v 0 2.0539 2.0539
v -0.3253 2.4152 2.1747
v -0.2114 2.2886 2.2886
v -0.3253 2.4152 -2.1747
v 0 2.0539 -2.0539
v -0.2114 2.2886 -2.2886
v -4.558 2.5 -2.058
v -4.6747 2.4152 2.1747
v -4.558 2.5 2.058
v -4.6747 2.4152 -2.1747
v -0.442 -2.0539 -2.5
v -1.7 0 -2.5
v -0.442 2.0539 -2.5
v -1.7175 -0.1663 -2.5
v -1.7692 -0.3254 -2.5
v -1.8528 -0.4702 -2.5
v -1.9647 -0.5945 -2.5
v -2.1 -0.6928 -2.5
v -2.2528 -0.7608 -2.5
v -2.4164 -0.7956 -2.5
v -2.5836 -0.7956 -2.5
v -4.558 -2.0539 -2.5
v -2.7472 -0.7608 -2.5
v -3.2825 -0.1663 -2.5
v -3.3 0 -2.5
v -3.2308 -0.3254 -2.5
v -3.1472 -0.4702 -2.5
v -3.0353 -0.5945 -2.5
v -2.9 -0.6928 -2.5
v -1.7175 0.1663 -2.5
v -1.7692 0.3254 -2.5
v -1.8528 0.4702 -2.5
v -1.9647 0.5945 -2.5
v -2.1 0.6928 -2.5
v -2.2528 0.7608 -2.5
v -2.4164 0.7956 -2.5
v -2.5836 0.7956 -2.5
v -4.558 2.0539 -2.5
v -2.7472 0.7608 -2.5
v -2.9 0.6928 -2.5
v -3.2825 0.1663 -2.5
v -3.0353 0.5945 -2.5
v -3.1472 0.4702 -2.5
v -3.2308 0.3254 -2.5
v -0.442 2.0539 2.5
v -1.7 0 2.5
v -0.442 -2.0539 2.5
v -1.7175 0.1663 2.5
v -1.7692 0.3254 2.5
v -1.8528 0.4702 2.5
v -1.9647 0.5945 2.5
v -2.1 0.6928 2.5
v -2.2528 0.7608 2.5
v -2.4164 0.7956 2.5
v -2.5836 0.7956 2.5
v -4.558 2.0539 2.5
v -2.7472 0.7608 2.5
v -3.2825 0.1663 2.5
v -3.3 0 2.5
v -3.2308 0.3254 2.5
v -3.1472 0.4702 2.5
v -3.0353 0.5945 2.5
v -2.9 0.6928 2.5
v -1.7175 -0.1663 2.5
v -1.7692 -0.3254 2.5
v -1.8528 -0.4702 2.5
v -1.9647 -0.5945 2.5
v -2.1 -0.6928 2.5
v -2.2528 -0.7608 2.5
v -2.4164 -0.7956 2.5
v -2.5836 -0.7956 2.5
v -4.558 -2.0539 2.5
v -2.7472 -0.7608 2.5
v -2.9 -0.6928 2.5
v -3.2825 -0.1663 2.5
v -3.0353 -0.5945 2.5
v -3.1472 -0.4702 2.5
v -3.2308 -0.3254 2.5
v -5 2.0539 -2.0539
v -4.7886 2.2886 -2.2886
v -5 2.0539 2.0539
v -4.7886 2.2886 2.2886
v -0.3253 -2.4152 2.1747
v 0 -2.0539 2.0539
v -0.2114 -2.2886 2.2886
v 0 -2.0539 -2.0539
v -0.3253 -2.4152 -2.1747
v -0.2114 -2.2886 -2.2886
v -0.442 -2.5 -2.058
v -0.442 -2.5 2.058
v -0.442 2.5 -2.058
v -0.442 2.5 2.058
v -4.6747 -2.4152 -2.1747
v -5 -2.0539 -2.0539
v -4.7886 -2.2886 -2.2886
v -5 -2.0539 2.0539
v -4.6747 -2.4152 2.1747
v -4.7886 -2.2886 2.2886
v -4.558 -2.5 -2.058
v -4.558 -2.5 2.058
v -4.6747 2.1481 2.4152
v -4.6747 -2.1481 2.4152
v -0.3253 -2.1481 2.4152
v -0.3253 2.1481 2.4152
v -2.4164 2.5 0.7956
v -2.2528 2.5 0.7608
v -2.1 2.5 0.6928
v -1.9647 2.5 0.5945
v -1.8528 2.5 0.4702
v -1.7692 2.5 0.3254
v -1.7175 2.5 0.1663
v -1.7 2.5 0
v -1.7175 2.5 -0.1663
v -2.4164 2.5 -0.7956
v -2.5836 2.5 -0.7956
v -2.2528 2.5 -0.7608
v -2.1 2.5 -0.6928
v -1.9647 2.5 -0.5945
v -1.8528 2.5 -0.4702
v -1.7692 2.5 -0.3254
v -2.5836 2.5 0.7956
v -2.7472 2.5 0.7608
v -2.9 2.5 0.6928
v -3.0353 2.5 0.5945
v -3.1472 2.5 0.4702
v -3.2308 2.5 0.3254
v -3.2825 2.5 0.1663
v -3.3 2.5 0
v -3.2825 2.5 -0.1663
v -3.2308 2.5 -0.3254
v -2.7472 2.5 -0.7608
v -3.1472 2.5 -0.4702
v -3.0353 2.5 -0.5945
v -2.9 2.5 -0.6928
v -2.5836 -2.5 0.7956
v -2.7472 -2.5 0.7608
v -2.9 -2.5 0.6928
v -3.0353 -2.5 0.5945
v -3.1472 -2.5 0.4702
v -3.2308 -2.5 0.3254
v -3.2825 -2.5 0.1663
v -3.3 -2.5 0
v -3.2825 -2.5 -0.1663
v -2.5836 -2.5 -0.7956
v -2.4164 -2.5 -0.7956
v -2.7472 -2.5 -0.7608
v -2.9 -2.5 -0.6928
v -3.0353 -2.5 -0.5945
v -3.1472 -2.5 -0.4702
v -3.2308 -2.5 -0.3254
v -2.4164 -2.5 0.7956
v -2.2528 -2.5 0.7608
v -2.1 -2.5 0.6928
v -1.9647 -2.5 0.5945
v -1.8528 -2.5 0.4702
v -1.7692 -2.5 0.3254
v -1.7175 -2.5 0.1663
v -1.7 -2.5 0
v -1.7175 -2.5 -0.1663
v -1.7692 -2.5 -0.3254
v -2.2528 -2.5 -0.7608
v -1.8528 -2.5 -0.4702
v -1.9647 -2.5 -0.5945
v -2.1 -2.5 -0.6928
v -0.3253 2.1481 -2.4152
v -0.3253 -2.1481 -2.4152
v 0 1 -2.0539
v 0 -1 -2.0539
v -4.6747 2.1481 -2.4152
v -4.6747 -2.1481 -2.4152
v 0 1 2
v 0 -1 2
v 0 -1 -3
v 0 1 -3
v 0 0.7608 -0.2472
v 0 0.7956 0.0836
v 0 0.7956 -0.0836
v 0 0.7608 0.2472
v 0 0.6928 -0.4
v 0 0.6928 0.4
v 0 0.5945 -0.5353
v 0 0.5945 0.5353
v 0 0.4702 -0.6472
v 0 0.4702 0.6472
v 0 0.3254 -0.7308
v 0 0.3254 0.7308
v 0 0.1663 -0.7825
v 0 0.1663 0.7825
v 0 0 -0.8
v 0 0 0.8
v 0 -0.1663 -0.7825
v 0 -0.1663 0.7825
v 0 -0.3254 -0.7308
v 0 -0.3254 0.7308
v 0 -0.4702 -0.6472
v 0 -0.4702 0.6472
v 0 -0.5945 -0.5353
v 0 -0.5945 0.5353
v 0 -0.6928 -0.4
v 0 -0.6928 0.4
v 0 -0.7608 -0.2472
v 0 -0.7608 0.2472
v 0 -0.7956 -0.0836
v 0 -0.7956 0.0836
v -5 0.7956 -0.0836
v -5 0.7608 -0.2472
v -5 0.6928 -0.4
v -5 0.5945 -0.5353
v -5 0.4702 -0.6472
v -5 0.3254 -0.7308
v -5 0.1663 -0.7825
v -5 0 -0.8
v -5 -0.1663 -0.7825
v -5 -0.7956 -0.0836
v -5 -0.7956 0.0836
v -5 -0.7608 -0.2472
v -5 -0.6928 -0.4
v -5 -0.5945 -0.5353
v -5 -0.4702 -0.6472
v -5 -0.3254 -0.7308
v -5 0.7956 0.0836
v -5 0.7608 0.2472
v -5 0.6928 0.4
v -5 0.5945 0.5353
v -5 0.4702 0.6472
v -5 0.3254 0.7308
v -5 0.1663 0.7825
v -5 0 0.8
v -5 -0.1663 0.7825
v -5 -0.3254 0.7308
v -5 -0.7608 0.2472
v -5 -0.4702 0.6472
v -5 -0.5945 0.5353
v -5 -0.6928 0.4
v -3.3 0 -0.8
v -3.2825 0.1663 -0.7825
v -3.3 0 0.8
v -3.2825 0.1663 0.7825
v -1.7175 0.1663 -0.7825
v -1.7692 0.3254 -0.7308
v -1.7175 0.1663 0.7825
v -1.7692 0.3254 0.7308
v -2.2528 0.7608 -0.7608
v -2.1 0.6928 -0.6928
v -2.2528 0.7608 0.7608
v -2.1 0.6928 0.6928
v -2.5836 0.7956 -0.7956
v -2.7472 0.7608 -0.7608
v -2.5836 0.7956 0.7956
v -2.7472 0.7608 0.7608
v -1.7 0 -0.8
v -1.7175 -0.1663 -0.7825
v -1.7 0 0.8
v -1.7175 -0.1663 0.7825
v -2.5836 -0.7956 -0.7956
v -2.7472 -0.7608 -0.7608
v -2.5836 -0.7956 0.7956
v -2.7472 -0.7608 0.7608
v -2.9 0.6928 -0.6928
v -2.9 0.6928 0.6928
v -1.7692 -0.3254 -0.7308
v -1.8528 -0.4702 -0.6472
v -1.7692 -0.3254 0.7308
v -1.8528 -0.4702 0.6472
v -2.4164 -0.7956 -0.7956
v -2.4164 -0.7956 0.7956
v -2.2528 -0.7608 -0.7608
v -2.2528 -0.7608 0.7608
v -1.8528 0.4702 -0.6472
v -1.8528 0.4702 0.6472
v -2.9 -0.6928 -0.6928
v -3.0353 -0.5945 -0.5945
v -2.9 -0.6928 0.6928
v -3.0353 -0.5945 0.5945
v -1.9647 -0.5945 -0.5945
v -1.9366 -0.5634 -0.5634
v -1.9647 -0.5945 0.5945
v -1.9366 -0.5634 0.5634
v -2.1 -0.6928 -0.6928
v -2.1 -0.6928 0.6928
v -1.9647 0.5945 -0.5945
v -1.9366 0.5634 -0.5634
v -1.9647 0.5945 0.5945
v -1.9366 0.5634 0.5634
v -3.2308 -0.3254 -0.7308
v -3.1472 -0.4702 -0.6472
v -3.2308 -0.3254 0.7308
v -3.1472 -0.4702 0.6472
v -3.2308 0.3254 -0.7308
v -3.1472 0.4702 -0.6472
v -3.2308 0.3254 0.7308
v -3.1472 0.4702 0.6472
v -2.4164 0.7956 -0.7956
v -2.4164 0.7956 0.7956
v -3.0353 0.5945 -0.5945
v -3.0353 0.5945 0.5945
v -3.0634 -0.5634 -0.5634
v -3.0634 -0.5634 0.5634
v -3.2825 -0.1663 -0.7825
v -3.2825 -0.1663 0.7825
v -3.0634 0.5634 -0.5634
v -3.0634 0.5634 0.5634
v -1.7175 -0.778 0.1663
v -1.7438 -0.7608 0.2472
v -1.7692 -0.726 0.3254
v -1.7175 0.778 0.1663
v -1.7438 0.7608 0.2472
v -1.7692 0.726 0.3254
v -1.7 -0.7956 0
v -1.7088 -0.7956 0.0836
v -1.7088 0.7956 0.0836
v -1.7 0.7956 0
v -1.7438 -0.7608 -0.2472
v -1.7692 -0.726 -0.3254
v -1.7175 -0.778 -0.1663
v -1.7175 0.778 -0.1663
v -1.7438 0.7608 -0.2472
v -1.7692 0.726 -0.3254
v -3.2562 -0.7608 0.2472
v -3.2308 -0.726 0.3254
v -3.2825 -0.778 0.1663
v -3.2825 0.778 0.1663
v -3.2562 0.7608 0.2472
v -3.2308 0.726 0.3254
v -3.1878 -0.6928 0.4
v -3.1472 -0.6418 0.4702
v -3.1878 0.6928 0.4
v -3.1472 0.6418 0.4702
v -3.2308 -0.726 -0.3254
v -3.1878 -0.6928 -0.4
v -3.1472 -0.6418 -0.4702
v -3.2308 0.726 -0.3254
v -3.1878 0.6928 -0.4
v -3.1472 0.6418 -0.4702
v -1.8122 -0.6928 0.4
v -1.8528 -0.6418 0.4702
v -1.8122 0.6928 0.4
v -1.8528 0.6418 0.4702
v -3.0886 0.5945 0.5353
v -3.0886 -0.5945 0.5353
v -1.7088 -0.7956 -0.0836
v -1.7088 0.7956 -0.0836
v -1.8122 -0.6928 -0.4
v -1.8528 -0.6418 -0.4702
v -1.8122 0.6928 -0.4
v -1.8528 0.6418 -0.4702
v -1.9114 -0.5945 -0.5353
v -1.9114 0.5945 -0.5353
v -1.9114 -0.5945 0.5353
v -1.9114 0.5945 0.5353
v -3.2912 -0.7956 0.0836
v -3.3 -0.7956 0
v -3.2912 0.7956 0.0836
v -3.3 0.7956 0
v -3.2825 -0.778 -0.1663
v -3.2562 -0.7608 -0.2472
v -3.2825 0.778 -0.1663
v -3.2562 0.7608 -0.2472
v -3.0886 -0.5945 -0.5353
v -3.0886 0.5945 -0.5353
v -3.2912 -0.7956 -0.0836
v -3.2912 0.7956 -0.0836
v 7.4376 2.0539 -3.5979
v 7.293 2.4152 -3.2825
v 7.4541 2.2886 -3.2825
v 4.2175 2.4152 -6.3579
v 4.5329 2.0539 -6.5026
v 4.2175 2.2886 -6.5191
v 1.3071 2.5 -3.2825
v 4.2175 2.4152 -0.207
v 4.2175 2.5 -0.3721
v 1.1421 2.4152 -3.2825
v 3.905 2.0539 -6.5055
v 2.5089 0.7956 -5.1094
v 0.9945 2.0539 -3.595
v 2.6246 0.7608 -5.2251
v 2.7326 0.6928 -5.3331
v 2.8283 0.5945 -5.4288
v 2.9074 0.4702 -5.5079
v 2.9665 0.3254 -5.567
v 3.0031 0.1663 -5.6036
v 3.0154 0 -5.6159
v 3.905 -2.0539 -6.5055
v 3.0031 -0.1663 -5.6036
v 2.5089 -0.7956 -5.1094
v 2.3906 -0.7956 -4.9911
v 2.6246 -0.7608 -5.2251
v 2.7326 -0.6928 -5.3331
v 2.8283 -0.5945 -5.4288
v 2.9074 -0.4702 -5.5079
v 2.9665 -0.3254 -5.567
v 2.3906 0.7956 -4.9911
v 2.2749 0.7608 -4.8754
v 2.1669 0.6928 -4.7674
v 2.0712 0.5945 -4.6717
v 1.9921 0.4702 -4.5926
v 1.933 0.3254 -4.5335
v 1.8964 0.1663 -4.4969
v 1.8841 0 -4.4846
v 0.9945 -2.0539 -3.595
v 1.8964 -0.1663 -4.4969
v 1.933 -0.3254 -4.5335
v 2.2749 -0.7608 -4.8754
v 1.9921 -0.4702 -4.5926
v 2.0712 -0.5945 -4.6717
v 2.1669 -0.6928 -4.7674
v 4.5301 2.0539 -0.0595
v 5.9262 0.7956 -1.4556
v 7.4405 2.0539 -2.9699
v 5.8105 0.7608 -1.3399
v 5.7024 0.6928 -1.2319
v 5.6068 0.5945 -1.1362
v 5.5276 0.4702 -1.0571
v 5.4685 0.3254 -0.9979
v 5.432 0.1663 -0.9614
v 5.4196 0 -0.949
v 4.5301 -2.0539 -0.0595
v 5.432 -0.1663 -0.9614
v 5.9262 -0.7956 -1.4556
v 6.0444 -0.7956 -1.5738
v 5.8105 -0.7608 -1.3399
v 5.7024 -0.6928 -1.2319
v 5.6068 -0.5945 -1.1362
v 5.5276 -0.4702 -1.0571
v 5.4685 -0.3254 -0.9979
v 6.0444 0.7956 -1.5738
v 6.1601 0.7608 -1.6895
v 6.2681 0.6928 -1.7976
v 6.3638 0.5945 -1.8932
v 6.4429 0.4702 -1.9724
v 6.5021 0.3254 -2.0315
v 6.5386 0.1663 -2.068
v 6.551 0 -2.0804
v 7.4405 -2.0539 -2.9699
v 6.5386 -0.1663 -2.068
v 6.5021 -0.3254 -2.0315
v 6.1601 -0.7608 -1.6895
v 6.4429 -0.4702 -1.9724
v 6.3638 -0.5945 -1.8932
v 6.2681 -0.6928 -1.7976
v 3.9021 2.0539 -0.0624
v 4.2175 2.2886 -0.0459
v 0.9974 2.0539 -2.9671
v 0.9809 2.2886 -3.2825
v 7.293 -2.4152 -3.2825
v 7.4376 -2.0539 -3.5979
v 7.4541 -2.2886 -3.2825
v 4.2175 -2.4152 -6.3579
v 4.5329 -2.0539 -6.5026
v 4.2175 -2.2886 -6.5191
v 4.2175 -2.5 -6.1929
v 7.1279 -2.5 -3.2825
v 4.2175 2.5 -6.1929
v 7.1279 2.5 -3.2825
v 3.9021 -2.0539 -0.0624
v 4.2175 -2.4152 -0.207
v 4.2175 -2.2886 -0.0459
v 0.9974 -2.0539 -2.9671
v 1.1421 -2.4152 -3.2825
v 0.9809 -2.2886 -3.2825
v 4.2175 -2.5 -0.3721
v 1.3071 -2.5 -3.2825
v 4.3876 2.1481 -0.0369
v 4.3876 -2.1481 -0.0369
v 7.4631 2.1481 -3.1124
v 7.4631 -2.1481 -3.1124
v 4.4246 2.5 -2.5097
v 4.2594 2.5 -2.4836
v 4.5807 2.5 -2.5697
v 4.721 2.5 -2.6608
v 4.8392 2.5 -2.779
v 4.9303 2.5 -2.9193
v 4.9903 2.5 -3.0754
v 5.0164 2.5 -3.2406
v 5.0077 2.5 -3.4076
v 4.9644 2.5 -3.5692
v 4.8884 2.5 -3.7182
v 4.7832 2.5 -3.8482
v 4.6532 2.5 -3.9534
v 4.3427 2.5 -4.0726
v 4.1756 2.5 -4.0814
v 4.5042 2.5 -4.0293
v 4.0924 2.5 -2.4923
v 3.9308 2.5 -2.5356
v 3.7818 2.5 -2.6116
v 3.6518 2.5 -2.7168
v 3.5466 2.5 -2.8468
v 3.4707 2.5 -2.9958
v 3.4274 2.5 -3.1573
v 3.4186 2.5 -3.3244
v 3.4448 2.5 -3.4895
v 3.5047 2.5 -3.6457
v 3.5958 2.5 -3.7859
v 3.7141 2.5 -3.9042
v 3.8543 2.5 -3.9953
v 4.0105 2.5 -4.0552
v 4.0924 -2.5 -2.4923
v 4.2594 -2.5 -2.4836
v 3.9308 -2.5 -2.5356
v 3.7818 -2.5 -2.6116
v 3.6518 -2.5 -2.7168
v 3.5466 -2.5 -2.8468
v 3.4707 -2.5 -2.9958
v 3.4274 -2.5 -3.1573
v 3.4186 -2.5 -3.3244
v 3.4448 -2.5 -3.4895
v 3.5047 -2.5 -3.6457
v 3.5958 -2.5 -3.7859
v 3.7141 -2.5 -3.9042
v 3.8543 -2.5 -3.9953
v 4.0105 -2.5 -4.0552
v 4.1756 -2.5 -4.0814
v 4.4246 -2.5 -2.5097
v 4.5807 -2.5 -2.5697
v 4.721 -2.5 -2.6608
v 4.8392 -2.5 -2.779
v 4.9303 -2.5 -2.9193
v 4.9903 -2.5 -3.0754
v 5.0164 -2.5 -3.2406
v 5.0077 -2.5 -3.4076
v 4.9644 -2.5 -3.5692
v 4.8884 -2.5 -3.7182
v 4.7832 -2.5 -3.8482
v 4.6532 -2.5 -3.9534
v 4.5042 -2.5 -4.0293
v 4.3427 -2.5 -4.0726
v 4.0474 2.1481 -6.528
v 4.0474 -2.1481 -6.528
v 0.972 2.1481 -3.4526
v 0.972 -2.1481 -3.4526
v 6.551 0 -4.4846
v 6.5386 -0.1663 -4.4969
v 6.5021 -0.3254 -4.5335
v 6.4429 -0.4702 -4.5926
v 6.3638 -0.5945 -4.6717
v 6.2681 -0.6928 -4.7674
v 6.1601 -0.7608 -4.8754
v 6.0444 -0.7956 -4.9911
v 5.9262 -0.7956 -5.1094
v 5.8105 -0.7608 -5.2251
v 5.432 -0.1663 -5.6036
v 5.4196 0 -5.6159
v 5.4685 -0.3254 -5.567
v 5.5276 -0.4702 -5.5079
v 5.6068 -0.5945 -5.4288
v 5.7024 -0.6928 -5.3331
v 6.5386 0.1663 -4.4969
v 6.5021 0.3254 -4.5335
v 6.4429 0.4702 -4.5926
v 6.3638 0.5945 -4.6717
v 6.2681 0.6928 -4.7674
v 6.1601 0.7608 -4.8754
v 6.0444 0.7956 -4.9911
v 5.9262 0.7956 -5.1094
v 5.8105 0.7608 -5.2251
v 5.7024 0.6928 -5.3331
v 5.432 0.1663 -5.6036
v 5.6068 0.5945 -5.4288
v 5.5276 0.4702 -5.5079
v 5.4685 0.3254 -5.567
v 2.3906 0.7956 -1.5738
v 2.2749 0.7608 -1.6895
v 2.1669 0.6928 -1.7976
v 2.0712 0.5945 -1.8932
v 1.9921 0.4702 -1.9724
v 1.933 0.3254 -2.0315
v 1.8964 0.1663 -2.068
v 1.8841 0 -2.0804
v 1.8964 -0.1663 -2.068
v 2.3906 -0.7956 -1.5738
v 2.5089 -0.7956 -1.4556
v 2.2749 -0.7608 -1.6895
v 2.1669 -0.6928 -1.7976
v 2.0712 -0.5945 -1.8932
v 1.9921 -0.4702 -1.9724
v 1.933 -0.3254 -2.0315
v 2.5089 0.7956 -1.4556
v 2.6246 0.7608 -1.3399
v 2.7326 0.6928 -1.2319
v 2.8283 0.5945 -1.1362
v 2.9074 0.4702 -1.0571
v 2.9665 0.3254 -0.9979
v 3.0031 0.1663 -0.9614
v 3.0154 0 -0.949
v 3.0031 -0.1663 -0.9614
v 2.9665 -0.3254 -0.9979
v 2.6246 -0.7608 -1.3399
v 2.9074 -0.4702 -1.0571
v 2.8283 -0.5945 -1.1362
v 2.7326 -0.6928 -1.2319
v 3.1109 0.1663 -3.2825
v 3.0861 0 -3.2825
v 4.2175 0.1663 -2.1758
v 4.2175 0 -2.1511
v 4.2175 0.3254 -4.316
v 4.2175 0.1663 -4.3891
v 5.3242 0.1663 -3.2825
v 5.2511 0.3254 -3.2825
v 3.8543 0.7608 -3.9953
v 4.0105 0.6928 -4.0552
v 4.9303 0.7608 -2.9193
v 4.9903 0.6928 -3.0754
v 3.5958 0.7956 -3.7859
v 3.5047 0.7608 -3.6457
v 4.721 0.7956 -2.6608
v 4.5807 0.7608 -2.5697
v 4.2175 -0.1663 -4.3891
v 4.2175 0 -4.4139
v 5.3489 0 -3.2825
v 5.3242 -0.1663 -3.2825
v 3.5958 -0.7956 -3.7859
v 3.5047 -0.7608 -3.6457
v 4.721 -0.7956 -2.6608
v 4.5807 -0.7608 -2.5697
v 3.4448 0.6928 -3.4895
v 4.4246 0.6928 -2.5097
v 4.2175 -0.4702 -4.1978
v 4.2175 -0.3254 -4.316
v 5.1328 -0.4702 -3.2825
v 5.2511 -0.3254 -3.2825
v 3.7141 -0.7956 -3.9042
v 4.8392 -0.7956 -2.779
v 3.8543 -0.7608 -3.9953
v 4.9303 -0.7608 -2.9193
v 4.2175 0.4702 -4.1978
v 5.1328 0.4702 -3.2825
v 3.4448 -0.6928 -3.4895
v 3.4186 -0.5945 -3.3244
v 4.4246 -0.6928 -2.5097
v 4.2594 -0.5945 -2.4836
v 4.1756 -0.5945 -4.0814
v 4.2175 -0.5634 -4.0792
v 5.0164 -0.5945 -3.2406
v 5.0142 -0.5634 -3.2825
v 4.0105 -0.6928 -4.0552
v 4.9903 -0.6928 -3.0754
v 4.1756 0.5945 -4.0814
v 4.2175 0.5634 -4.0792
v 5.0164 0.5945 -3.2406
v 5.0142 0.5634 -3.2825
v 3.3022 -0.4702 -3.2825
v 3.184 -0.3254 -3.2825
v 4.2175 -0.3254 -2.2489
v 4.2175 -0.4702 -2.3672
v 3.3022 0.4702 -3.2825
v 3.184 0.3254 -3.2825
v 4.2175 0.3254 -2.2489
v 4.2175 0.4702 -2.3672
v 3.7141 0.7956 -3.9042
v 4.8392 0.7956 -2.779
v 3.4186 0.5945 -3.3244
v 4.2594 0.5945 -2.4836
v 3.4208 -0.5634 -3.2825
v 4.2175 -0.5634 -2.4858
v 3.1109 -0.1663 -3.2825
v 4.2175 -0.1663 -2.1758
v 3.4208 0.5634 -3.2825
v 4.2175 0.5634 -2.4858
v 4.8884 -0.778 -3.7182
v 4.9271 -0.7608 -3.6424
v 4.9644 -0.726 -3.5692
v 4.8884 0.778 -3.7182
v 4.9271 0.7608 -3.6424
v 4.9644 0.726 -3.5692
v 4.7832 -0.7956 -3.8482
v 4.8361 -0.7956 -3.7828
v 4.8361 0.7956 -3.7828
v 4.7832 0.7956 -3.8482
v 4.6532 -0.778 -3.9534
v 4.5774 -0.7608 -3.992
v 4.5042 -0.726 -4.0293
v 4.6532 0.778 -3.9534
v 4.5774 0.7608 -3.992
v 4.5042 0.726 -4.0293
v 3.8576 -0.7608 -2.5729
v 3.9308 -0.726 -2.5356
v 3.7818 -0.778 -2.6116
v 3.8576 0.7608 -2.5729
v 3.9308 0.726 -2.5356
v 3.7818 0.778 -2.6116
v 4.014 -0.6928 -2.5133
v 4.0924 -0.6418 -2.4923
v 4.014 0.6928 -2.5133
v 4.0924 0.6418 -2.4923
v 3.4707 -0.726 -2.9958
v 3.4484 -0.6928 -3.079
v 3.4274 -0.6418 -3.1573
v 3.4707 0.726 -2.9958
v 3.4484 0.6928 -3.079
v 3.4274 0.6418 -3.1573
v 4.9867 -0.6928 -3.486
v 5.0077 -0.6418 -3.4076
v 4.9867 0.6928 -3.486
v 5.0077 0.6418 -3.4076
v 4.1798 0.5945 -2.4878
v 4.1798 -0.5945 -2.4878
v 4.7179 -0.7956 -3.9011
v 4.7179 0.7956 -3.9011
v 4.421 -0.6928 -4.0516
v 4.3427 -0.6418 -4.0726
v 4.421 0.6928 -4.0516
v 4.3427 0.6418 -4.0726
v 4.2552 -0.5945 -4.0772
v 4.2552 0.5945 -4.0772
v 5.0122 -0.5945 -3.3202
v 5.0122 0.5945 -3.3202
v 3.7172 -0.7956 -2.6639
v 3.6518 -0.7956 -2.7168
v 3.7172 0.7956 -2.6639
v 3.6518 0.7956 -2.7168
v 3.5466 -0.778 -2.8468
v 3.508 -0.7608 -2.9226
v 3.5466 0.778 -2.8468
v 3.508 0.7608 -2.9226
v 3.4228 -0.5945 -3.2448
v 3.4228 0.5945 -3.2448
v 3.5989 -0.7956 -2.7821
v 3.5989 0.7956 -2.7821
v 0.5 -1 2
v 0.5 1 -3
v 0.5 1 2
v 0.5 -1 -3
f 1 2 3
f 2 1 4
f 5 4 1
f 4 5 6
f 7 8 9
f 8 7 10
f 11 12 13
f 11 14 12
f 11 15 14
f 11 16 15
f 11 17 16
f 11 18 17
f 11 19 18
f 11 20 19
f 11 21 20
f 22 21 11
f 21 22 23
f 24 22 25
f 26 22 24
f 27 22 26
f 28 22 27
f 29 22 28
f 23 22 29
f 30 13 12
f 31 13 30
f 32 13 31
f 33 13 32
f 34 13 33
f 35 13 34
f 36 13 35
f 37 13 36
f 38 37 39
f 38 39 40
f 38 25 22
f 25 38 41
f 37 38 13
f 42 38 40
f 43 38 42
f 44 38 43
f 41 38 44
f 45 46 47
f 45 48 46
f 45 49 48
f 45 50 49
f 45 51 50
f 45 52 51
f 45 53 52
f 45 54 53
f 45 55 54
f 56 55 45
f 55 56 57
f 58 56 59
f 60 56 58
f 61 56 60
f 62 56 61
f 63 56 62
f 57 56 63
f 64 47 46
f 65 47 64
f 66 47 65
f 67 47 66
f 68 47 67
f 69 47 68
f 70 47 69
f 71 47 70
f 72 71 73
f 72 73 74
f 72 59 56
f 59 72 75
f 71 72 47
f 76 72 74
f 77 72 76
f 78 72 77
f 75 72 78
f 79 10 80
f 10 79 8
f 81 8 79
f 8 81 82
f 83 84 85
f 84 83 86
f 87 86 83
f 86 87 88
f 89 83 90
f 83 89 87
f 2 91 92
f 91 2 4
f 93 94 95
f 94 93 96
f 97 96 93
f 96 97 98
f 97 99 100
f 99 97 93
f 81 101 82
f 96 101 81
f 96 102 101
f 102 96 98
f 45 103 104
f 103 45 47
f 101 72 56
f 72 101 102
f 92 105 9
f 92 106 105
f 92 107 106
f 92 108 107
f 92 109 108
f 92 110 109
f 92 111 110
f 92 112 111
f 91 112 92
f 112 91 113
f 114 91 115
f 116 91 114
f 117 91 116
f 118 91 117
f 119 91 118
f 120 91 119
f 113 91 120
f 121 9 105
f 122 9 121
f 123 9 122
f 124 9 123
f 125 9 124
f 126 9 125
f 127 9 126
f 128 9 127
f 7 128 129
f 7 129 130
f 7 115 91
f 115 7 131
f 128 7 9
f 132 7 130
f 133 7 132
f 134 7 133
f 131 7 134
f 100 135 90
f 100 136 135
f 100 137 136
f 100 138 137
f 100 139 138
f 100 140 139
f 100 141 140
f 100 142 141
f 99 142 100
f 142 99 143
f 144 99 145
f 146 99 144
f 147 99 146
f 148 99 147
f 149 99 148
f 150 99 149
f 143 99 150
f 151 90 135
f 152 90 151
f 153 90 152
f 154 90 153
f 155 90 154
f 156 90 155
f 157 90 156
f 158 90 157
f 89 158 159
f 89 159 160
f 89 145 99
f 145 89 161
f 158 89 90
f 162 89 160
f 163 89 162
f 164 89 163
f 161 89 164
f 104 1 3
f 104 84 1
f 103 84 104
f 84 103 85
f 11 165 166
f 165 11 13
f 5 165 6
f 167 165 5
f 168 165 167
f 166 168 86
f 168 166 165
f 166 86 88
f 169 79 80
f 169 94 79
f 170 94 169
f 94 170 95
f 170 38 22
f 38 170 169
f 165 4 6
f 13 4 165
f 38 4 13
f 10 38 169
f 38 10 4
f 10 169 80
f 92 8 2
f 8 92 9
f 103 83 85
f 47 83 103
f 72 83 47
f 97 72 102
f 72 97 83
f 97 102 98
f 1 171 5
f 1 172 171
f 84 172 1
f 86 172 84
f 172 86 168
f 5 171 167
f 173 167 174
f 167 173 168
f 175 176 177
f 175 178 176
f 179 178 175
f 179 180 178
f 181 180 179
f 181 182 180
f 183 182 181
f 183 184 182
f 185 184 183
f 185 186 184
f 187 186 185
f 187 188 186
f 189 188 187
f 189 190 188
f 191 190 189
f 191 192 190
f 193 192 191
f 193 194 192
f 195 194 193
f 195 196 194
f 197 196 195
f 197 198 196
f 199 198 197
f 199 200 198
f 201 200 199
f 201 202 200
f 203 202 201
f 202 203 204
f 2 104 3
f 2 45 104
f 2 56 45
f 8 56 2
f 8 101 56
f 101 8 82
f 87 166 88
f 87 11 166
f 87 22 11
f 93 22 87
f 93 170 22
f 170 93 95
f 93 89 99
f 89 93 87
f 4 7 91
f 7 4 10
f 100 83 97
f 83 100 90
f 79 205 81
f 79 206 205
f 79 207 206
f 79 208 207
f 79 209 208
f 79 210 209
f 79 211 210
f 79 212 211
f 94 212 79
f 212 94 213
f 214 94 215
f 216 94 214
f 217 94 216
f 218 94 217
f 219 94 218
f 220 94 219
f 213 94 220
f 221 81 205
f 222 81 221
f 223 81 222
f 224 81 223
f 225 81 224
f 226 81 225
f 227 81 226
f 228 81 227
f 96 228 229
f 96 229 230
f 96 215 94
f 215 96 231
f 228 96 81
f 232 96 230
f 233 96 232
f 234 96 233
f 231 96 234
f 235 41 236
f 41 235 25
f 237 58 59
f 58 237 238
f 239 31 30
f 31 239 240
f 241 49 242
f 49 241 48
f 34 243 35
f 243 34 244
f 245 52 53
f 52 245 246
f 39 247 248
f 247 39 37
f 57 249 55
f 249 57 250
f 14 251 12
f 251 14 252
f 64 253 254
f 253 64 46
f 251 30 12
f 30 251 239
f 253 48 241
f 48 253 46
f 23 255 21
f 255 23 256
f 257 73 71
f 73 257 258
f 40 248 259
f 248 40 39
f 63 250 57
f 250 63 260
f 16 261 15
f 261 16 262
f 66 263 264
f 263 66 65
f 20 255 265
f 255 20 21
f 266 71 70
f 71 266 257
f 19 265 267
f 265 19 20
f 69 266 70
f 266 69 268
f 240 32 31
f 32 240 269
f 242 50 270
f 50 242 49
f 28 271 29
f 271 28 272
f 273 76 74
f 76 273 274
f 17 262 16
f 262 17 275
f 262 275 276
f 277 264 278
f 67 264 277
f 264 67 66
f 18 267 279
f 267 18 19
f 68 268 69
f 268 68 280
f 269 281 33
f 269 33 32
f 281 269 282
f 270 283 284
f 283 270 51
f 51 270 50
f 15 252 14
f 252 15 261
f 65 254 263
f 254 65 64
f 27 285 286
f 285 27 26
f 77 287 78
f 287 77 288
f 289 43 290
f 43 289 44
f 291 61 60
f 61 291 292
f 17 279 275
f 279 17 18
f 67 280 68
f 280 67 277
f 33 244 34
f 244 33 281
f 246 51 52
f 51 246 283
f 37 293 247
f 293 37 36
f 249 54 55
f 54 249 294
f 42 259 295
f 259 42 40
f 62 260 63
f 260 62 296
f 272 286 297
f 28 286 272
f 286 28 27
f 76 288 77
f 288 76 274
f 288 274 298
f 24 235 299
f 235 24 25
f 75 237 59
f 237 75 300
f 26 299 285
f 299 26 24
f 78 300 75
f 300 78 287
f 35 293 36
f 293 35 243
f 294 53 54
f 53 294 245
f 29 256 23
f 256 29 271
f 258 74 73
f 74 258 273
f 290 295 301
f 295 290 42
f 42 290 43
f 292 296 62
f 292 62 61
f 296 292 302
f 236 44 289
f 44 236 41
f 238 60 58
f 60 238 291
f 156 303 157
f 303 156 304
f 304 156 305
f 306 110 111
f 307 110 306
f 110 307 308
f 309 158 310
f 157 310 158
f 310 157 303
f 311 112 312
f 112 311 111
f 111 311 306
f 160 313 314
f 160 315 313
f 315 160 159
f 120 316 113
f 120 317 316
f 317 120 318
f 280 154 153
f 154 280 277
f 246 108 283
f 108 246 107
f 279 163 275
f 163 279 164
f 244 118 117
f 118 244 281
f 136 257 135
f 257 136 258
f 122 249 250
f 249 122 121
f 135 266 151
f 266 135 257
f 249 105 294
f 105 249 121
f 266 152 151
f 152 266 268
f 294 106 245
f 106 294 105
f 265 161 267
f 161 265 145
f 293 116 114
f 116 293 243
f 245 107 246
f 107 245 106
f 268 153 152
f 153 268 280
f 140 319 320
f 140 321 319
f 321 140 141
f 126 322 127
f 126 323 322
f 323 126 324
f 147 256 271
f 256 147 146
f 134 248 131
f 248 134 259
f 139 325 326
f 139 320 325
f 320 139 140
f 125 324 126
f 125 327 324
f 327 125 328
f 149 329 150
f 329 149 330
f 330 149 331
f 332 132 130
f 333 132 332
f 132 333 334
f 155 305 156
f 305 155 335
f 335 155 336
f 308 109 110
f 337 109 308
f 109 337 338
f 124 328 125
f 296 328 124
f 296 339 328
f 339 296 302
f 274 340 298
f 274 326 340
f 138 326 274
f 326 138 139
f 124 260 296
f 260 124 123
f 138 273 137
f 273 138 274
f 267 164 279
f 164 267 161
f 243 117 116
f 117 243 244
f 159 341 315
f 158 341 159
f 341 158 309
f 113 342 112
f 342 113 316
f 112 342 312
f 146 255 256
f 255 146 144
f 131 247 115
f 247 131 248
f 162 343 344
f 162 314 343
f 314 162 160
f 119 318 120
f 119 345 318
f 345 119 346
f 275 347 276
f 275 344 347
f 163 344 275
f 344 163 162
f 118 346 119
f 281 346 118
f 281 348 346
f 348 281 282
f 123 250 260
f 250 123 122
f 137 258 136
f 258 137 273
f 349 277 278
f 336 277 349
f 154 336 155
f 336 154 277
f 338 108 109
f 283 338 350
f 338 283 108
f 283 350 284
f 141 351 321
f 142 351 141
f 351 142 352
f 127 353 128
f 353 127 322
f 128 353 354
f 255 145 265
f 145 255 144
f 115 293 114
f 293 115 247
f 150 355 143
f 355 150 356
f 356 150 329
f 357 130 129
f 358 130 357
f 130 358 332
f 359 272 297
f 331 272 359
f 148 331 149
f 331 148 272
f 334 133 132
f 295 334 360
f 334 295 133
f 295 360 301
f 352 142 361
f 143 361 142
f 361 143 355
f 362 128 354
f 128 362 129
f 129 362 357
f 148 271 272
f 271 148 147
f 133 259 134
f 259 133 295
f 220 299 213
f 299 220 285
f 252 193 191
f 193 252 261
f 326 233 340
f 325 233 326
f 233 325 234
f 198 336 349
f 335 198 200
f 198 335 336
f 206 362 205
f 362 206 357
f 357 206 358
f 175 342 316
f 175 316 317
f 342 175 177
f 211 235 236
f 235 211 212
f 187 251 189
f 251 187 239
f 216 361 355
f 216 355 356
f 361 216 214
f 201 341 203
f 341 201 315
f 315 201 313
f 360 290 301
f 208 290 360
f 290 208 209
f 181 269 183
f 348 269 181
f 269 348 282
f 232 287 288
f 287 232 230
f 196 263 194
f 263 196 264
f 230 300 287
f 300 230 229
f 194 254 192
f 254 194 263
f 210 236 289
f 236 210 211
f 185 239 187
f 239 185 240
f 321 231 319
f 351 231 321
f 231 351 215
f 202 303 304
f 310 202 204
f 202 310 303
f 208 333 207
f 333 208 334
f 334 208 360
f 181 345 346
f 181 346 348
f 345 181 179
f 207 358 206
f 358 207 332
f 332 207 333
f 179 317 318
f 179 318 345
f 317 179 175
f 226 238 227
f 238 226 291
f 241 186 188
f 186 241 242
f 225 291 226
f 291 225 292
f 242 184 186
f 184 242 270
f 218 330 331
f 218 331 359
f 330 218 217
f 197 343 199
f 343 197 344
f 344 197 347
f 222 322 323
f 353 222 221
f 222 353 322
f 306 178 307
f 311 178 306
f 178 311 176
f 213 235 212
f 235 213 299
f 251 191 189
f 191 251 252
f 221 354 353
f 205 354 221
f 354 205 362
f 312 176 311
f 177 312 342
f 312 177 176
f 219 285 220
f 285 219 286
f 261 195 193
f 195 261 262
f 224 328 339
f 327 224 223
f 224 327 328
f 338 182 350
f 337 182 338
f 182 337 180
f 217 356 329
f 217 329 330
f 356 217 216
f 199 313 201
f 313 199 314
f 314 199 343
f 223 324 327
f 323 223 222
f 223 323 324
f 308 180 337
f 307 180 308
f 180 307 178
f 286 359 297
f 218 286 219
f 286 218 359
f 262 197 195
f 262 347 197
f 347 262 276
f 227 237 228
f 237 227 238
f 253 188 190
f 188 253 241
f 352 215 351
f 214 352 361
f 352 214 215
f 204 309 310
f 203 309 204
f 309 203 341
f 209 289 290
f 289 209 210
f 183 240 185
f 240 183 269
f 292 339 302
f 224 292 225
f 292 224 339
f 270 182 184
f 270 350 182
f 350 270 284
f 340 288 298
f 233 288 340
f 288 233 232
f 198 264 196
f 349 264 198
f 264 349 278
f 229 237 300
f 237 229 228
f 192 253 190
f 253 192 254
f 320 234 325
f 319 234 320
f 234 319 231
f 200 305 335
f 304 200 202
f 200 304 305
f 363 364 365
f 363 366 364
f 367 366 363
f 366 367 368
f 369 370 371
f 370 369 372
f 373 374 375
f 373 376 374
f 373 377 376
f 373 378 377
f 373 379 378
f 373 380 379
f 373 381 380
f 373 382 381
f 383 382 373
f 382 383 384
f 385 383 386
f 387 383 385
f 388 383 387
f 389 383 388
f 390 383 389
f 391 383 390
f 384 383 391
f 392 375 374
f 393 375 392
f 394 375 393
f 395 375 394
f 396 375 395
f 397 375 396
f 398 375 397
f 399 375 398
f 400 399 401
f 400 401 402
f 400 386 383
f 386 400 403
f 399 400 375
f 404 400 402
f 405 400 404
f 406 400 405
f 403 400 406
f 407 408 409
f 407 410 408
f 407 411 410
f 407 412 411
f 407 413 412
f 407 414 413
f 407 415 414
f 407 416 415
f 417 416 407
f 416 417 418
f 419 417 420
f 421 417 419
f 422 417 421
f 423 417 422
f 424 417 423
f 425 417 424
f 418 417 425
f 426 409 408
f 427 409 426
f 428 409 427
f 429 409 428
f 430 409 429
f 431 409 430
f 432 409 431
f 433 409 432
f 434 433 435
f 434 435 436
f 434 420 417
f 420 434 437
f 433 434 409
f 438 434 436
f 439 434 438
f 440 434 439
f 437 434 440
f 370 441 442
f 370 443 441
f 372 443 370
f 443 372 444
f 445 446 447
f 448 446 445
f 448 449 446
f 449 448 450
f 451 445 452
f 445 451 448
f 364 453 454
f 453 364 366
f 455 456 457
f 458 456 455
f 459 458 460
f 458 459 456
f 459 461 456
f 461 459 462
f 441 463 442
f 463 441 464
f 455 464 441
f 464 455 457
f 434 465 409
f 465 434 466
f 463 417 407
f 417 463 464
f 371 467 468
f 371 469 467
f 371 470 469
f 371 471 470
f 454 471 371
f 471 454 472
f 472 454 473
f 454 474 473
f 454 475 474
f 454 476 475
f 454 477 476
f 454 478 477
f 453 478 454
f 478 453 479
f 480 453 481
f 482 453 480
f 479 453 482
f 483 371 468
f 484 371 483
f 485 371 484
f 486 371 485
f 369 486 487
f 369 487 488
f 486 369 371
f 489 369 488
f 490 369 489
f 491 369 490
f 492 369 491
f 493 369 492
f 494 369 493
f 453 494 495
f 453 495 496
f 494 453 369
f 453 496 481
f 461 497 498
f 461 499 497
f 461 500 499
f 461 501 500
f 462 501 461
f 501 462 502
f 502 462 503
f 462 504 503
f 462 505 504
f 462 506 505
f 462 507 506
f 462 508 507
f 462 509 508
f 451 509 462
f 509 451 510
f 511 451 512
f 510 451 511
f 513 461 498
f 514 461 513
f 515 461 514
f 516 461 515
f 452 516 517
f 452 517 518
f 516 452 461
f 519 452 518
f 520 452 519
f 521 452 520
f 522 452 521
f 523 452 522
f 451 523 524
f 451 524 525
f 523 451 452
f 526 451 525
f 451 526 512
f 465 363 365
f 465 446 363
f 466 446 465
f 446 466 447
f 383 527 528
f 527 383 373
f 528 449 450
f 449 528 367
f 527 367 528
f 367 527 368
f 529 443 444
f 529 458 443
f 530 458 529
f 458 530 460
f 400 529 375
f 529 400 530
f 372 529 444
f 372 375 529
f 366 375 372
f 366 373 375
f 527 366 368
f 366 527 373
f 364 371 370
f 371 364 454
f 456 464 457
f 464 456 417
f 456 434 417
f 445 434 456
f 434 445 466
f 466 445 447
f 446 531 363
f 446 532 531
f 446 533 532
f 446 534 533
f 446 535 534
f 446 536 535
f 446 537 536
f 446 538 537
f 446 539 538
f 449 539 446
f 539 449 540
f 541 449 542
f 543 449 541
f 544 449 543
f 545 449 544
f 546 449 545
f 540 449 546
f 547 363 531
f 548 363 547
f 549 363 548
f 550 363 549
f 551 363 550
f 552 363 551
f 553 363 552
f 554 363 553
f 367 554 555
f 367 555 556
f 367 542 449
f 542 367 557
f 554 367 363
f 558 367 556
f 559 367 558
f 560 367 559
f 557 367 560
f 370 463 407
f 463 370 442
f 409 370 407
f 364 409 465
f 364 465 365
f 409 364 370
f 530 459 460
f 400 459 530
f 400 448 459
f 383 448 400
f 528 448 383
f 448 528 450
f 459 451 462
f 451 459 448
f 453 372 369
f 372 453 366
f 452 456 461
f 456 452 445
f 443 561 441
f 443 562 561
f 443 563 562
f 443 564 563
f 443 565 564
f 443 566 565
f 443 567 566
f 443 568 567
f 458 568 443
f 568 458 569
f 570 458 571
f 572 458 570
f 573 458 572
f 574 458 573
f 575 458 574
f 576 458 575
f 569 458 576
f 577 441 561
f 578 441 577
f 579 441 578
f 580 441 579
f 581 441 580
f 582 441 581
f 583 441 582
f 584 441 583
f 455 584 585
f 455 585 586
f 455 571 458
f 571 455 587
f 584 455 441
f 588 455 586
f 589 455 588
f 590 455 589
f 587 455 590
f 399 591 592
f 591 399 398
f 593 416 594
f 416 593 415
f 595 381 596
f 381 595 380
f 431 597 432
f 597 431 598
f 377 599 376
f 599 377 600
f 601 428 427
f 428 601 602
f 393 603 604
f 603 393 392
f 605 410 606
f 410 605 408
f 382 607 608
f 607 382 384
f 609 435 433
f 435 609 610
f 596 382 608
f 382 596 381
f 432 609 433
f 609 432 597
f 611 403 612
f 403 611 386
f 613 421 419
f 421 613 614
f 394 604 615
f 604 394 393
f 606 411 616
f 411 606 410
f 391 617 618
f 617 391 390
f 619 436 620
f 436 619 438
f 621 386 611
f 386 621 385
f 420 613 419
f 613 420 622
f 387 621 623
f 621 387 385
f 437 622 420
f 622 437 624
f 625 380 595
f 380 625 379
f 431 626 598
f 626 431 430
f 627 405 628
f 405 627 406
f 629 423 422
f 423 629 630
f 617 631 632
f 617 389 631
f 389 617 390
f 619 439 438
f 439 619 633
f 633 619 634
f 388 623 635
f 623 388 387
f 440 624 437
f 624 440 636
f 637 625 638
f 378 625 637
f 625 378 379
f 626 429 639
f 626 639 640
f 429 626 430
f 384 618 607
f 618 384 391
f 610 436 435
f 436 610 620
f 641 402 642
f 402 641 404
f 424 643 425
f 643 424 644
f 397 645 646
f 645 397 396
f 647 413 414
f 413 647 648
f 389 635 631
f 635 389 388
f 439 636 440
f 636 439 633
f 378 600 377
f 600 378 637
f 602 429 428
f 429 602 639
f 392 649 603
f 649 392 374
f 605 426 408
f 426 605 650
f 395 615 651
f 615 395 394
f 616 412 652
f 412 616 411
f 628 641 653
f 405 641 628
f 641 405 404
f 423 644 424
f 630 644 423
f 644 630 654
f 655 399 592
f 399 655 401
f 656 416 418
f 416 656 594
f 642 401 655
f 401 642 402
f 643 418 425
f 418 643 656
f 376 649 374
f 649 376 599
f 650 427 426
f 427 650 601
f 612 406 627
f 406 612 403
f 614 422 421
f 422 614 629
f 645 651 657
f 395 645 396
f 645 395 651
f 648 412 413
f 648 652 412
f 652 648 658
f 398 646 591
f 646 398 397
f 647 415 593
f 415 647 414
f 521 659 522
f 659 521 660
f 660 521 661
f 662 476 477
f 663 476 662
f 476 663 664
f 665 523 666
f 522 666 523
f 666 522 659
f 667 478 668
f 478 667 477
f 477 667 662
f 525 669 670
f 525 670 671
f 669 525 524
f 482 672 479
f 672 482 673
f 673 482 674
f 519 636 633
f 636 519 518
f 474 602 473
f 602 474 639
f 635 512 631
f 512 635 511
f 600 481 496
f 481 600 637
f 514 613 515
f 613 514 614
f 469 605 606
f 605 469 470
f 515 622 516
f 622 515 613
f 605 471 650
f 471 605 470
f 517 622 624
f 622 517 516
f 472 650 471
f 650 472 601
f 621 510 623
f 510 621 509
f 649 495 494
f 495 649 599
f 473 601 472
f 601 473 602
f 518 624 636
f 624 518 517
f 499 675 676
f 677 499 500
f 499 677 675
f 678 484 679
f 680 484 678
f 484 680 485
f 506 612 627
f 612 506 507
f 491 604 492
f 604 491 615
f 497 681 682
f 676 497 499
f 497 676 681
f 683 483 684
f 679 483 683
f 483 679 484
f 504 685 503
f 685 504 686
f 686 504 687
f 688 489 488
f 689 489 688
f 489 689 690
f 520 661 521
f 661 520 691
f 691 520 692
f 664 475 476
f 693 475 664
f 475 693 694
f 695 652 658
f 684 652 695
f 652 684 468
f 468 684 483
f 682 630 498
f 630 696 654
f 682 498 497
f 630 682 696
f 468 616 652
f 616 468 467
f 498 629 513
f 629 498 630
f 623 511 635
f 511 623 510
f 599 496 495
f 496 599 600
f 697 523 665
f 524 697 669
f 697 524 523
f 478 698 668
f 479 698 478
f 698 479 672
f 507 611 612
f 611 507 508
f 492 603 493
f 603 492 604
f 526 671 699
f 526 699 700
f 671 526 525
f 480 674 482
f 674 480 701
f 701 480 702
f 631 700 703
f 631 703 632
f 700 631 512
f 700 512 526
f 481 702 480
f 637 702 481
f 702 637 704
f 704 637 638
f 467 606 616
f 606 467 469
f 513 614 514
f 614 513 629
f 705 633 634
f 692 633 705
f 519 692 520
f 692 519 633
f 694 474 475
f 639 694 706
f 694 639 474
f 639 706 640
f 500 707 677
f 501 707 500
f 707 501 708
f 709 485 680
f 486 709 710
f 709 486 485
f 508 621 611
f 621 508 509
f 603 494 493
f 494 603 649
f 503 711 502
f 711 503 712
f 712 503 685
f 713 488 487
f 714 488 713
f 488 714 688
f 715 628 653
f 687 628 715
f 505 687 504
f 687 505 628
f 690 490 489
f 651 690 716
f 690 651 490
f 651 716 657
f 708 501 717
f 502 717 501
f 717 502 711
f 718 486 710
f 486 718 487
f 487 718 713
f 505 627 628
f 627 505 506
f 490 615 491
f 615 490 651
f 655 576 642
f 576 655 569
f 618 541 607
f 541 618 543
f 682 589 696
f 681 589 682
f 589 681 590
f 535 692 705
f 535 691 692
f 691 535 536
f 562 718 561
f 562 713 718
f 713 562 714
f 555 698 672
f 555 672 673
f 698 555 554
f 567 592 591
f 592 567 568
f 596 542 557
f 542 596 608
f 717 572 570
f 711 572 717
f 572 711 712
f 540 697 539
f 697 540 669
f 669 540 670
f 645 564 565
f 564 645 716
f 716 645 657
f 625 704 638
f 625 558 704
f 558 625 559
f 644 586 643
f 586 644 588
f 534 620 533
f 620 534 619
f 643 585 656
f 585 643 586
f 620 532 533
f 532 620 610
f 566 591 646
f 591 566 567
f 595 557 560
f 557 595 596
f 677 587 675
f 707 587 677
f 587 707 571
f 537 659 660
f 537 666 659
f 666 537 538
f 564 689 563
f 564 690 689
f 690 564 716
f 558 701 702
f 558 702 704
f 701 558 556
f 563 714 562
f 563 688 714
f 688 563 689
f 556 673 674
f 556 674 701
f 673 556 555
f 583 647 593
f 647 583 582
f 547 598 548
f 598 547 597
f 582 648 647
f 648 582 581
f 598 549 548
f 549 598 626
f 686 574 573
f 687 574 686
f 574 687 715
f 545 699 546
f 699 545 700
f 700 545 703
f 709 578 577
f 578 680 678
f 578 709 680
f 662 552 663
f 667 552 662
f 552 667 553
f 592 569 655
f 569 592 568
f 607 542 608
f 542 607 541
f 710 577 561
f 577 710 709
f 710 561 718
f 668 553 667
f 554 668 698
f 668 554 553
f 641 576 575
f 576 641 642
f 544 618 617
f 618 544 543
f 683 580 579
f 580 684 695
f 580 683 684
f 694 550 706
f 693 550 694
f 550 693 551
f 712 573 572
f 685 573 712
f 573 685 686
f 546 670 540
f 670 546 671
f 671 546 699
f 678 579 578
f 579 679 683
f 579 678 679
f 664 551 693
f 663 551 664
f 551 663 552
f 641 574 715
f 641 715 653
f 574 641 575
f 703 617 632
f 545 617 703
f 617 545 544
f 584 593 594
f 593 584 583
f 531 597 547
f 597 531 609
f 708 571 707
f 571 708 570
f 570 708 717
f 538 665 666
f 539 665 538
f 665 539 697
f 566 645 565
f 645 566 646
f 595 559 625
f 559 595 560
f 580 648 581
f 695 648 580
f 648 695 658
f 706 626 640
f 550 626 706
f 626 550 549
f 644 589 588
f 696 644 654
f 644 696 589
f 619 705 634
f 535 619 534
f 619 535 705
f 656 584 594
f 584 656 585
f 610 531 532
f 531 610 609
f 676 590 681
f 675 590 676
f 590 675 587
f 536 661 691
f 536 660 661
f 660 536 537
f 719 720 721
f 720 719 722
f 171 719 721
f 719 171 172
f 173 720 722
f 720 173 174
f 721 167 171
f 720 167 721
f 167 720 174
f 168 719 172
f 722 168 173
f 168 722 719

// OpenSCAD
$fn =30;
module peghole(){
    color("Blue")cylinder (6, .8, .8, true);
}

module edge(){
cylinder (5, 3.25, 3.25, true);
}
module block(){
    intersection(){
edge();
rotate([90,0,0]) edge();
rotate([0, 90, 0]) edge();
}
}
module blox(){
difference(){ 
block();
   peghole();
rotate ([90, 0, 0]) peghole();
rotate ([0, 90, 0]) peghole();
}
}
module cross(){
blox();
translate([5,0,0]) blox();
translate([-5,0,0]) blox();
translate([0,0,5]) blox();
translate([0,0,-5]) blox();
}
module corner(){difference(){
    block();
   translate([-3,-3,3])rotate([0,45,0])
cube([8,6
   ,4]) color("Red");
 rotate([0,45,0]) peghole();   
}
}
module opcorner(){
    translate([5,0,5]) corner();
translate([-5,0,-5]) rotate([0,180,0])corner();
}
module oct() {
    opcorner();
rotate([0,90,0]) opcorner();
    cross();
}
module long(){
    oct();
translate([0,5,0]) oct();
translate([0,-5,0]) oct();
}
//difference(){
//long();
//cube([10,10,5], true);
//cube([5,10,10], true);
//}
module test(){
translate([0,0,10]) blox();
rotate([0,45,0]) translate([0,0,9.5]) blox();
}
translate([-2.5,0,-10]) test();
translate([0,-1,-3]) cube([.5,2,5]);

//translate([3.25,0,3.25]) rotate([0,45,0]) block();

//cross();
//rotate([0,45,0]) cross();
